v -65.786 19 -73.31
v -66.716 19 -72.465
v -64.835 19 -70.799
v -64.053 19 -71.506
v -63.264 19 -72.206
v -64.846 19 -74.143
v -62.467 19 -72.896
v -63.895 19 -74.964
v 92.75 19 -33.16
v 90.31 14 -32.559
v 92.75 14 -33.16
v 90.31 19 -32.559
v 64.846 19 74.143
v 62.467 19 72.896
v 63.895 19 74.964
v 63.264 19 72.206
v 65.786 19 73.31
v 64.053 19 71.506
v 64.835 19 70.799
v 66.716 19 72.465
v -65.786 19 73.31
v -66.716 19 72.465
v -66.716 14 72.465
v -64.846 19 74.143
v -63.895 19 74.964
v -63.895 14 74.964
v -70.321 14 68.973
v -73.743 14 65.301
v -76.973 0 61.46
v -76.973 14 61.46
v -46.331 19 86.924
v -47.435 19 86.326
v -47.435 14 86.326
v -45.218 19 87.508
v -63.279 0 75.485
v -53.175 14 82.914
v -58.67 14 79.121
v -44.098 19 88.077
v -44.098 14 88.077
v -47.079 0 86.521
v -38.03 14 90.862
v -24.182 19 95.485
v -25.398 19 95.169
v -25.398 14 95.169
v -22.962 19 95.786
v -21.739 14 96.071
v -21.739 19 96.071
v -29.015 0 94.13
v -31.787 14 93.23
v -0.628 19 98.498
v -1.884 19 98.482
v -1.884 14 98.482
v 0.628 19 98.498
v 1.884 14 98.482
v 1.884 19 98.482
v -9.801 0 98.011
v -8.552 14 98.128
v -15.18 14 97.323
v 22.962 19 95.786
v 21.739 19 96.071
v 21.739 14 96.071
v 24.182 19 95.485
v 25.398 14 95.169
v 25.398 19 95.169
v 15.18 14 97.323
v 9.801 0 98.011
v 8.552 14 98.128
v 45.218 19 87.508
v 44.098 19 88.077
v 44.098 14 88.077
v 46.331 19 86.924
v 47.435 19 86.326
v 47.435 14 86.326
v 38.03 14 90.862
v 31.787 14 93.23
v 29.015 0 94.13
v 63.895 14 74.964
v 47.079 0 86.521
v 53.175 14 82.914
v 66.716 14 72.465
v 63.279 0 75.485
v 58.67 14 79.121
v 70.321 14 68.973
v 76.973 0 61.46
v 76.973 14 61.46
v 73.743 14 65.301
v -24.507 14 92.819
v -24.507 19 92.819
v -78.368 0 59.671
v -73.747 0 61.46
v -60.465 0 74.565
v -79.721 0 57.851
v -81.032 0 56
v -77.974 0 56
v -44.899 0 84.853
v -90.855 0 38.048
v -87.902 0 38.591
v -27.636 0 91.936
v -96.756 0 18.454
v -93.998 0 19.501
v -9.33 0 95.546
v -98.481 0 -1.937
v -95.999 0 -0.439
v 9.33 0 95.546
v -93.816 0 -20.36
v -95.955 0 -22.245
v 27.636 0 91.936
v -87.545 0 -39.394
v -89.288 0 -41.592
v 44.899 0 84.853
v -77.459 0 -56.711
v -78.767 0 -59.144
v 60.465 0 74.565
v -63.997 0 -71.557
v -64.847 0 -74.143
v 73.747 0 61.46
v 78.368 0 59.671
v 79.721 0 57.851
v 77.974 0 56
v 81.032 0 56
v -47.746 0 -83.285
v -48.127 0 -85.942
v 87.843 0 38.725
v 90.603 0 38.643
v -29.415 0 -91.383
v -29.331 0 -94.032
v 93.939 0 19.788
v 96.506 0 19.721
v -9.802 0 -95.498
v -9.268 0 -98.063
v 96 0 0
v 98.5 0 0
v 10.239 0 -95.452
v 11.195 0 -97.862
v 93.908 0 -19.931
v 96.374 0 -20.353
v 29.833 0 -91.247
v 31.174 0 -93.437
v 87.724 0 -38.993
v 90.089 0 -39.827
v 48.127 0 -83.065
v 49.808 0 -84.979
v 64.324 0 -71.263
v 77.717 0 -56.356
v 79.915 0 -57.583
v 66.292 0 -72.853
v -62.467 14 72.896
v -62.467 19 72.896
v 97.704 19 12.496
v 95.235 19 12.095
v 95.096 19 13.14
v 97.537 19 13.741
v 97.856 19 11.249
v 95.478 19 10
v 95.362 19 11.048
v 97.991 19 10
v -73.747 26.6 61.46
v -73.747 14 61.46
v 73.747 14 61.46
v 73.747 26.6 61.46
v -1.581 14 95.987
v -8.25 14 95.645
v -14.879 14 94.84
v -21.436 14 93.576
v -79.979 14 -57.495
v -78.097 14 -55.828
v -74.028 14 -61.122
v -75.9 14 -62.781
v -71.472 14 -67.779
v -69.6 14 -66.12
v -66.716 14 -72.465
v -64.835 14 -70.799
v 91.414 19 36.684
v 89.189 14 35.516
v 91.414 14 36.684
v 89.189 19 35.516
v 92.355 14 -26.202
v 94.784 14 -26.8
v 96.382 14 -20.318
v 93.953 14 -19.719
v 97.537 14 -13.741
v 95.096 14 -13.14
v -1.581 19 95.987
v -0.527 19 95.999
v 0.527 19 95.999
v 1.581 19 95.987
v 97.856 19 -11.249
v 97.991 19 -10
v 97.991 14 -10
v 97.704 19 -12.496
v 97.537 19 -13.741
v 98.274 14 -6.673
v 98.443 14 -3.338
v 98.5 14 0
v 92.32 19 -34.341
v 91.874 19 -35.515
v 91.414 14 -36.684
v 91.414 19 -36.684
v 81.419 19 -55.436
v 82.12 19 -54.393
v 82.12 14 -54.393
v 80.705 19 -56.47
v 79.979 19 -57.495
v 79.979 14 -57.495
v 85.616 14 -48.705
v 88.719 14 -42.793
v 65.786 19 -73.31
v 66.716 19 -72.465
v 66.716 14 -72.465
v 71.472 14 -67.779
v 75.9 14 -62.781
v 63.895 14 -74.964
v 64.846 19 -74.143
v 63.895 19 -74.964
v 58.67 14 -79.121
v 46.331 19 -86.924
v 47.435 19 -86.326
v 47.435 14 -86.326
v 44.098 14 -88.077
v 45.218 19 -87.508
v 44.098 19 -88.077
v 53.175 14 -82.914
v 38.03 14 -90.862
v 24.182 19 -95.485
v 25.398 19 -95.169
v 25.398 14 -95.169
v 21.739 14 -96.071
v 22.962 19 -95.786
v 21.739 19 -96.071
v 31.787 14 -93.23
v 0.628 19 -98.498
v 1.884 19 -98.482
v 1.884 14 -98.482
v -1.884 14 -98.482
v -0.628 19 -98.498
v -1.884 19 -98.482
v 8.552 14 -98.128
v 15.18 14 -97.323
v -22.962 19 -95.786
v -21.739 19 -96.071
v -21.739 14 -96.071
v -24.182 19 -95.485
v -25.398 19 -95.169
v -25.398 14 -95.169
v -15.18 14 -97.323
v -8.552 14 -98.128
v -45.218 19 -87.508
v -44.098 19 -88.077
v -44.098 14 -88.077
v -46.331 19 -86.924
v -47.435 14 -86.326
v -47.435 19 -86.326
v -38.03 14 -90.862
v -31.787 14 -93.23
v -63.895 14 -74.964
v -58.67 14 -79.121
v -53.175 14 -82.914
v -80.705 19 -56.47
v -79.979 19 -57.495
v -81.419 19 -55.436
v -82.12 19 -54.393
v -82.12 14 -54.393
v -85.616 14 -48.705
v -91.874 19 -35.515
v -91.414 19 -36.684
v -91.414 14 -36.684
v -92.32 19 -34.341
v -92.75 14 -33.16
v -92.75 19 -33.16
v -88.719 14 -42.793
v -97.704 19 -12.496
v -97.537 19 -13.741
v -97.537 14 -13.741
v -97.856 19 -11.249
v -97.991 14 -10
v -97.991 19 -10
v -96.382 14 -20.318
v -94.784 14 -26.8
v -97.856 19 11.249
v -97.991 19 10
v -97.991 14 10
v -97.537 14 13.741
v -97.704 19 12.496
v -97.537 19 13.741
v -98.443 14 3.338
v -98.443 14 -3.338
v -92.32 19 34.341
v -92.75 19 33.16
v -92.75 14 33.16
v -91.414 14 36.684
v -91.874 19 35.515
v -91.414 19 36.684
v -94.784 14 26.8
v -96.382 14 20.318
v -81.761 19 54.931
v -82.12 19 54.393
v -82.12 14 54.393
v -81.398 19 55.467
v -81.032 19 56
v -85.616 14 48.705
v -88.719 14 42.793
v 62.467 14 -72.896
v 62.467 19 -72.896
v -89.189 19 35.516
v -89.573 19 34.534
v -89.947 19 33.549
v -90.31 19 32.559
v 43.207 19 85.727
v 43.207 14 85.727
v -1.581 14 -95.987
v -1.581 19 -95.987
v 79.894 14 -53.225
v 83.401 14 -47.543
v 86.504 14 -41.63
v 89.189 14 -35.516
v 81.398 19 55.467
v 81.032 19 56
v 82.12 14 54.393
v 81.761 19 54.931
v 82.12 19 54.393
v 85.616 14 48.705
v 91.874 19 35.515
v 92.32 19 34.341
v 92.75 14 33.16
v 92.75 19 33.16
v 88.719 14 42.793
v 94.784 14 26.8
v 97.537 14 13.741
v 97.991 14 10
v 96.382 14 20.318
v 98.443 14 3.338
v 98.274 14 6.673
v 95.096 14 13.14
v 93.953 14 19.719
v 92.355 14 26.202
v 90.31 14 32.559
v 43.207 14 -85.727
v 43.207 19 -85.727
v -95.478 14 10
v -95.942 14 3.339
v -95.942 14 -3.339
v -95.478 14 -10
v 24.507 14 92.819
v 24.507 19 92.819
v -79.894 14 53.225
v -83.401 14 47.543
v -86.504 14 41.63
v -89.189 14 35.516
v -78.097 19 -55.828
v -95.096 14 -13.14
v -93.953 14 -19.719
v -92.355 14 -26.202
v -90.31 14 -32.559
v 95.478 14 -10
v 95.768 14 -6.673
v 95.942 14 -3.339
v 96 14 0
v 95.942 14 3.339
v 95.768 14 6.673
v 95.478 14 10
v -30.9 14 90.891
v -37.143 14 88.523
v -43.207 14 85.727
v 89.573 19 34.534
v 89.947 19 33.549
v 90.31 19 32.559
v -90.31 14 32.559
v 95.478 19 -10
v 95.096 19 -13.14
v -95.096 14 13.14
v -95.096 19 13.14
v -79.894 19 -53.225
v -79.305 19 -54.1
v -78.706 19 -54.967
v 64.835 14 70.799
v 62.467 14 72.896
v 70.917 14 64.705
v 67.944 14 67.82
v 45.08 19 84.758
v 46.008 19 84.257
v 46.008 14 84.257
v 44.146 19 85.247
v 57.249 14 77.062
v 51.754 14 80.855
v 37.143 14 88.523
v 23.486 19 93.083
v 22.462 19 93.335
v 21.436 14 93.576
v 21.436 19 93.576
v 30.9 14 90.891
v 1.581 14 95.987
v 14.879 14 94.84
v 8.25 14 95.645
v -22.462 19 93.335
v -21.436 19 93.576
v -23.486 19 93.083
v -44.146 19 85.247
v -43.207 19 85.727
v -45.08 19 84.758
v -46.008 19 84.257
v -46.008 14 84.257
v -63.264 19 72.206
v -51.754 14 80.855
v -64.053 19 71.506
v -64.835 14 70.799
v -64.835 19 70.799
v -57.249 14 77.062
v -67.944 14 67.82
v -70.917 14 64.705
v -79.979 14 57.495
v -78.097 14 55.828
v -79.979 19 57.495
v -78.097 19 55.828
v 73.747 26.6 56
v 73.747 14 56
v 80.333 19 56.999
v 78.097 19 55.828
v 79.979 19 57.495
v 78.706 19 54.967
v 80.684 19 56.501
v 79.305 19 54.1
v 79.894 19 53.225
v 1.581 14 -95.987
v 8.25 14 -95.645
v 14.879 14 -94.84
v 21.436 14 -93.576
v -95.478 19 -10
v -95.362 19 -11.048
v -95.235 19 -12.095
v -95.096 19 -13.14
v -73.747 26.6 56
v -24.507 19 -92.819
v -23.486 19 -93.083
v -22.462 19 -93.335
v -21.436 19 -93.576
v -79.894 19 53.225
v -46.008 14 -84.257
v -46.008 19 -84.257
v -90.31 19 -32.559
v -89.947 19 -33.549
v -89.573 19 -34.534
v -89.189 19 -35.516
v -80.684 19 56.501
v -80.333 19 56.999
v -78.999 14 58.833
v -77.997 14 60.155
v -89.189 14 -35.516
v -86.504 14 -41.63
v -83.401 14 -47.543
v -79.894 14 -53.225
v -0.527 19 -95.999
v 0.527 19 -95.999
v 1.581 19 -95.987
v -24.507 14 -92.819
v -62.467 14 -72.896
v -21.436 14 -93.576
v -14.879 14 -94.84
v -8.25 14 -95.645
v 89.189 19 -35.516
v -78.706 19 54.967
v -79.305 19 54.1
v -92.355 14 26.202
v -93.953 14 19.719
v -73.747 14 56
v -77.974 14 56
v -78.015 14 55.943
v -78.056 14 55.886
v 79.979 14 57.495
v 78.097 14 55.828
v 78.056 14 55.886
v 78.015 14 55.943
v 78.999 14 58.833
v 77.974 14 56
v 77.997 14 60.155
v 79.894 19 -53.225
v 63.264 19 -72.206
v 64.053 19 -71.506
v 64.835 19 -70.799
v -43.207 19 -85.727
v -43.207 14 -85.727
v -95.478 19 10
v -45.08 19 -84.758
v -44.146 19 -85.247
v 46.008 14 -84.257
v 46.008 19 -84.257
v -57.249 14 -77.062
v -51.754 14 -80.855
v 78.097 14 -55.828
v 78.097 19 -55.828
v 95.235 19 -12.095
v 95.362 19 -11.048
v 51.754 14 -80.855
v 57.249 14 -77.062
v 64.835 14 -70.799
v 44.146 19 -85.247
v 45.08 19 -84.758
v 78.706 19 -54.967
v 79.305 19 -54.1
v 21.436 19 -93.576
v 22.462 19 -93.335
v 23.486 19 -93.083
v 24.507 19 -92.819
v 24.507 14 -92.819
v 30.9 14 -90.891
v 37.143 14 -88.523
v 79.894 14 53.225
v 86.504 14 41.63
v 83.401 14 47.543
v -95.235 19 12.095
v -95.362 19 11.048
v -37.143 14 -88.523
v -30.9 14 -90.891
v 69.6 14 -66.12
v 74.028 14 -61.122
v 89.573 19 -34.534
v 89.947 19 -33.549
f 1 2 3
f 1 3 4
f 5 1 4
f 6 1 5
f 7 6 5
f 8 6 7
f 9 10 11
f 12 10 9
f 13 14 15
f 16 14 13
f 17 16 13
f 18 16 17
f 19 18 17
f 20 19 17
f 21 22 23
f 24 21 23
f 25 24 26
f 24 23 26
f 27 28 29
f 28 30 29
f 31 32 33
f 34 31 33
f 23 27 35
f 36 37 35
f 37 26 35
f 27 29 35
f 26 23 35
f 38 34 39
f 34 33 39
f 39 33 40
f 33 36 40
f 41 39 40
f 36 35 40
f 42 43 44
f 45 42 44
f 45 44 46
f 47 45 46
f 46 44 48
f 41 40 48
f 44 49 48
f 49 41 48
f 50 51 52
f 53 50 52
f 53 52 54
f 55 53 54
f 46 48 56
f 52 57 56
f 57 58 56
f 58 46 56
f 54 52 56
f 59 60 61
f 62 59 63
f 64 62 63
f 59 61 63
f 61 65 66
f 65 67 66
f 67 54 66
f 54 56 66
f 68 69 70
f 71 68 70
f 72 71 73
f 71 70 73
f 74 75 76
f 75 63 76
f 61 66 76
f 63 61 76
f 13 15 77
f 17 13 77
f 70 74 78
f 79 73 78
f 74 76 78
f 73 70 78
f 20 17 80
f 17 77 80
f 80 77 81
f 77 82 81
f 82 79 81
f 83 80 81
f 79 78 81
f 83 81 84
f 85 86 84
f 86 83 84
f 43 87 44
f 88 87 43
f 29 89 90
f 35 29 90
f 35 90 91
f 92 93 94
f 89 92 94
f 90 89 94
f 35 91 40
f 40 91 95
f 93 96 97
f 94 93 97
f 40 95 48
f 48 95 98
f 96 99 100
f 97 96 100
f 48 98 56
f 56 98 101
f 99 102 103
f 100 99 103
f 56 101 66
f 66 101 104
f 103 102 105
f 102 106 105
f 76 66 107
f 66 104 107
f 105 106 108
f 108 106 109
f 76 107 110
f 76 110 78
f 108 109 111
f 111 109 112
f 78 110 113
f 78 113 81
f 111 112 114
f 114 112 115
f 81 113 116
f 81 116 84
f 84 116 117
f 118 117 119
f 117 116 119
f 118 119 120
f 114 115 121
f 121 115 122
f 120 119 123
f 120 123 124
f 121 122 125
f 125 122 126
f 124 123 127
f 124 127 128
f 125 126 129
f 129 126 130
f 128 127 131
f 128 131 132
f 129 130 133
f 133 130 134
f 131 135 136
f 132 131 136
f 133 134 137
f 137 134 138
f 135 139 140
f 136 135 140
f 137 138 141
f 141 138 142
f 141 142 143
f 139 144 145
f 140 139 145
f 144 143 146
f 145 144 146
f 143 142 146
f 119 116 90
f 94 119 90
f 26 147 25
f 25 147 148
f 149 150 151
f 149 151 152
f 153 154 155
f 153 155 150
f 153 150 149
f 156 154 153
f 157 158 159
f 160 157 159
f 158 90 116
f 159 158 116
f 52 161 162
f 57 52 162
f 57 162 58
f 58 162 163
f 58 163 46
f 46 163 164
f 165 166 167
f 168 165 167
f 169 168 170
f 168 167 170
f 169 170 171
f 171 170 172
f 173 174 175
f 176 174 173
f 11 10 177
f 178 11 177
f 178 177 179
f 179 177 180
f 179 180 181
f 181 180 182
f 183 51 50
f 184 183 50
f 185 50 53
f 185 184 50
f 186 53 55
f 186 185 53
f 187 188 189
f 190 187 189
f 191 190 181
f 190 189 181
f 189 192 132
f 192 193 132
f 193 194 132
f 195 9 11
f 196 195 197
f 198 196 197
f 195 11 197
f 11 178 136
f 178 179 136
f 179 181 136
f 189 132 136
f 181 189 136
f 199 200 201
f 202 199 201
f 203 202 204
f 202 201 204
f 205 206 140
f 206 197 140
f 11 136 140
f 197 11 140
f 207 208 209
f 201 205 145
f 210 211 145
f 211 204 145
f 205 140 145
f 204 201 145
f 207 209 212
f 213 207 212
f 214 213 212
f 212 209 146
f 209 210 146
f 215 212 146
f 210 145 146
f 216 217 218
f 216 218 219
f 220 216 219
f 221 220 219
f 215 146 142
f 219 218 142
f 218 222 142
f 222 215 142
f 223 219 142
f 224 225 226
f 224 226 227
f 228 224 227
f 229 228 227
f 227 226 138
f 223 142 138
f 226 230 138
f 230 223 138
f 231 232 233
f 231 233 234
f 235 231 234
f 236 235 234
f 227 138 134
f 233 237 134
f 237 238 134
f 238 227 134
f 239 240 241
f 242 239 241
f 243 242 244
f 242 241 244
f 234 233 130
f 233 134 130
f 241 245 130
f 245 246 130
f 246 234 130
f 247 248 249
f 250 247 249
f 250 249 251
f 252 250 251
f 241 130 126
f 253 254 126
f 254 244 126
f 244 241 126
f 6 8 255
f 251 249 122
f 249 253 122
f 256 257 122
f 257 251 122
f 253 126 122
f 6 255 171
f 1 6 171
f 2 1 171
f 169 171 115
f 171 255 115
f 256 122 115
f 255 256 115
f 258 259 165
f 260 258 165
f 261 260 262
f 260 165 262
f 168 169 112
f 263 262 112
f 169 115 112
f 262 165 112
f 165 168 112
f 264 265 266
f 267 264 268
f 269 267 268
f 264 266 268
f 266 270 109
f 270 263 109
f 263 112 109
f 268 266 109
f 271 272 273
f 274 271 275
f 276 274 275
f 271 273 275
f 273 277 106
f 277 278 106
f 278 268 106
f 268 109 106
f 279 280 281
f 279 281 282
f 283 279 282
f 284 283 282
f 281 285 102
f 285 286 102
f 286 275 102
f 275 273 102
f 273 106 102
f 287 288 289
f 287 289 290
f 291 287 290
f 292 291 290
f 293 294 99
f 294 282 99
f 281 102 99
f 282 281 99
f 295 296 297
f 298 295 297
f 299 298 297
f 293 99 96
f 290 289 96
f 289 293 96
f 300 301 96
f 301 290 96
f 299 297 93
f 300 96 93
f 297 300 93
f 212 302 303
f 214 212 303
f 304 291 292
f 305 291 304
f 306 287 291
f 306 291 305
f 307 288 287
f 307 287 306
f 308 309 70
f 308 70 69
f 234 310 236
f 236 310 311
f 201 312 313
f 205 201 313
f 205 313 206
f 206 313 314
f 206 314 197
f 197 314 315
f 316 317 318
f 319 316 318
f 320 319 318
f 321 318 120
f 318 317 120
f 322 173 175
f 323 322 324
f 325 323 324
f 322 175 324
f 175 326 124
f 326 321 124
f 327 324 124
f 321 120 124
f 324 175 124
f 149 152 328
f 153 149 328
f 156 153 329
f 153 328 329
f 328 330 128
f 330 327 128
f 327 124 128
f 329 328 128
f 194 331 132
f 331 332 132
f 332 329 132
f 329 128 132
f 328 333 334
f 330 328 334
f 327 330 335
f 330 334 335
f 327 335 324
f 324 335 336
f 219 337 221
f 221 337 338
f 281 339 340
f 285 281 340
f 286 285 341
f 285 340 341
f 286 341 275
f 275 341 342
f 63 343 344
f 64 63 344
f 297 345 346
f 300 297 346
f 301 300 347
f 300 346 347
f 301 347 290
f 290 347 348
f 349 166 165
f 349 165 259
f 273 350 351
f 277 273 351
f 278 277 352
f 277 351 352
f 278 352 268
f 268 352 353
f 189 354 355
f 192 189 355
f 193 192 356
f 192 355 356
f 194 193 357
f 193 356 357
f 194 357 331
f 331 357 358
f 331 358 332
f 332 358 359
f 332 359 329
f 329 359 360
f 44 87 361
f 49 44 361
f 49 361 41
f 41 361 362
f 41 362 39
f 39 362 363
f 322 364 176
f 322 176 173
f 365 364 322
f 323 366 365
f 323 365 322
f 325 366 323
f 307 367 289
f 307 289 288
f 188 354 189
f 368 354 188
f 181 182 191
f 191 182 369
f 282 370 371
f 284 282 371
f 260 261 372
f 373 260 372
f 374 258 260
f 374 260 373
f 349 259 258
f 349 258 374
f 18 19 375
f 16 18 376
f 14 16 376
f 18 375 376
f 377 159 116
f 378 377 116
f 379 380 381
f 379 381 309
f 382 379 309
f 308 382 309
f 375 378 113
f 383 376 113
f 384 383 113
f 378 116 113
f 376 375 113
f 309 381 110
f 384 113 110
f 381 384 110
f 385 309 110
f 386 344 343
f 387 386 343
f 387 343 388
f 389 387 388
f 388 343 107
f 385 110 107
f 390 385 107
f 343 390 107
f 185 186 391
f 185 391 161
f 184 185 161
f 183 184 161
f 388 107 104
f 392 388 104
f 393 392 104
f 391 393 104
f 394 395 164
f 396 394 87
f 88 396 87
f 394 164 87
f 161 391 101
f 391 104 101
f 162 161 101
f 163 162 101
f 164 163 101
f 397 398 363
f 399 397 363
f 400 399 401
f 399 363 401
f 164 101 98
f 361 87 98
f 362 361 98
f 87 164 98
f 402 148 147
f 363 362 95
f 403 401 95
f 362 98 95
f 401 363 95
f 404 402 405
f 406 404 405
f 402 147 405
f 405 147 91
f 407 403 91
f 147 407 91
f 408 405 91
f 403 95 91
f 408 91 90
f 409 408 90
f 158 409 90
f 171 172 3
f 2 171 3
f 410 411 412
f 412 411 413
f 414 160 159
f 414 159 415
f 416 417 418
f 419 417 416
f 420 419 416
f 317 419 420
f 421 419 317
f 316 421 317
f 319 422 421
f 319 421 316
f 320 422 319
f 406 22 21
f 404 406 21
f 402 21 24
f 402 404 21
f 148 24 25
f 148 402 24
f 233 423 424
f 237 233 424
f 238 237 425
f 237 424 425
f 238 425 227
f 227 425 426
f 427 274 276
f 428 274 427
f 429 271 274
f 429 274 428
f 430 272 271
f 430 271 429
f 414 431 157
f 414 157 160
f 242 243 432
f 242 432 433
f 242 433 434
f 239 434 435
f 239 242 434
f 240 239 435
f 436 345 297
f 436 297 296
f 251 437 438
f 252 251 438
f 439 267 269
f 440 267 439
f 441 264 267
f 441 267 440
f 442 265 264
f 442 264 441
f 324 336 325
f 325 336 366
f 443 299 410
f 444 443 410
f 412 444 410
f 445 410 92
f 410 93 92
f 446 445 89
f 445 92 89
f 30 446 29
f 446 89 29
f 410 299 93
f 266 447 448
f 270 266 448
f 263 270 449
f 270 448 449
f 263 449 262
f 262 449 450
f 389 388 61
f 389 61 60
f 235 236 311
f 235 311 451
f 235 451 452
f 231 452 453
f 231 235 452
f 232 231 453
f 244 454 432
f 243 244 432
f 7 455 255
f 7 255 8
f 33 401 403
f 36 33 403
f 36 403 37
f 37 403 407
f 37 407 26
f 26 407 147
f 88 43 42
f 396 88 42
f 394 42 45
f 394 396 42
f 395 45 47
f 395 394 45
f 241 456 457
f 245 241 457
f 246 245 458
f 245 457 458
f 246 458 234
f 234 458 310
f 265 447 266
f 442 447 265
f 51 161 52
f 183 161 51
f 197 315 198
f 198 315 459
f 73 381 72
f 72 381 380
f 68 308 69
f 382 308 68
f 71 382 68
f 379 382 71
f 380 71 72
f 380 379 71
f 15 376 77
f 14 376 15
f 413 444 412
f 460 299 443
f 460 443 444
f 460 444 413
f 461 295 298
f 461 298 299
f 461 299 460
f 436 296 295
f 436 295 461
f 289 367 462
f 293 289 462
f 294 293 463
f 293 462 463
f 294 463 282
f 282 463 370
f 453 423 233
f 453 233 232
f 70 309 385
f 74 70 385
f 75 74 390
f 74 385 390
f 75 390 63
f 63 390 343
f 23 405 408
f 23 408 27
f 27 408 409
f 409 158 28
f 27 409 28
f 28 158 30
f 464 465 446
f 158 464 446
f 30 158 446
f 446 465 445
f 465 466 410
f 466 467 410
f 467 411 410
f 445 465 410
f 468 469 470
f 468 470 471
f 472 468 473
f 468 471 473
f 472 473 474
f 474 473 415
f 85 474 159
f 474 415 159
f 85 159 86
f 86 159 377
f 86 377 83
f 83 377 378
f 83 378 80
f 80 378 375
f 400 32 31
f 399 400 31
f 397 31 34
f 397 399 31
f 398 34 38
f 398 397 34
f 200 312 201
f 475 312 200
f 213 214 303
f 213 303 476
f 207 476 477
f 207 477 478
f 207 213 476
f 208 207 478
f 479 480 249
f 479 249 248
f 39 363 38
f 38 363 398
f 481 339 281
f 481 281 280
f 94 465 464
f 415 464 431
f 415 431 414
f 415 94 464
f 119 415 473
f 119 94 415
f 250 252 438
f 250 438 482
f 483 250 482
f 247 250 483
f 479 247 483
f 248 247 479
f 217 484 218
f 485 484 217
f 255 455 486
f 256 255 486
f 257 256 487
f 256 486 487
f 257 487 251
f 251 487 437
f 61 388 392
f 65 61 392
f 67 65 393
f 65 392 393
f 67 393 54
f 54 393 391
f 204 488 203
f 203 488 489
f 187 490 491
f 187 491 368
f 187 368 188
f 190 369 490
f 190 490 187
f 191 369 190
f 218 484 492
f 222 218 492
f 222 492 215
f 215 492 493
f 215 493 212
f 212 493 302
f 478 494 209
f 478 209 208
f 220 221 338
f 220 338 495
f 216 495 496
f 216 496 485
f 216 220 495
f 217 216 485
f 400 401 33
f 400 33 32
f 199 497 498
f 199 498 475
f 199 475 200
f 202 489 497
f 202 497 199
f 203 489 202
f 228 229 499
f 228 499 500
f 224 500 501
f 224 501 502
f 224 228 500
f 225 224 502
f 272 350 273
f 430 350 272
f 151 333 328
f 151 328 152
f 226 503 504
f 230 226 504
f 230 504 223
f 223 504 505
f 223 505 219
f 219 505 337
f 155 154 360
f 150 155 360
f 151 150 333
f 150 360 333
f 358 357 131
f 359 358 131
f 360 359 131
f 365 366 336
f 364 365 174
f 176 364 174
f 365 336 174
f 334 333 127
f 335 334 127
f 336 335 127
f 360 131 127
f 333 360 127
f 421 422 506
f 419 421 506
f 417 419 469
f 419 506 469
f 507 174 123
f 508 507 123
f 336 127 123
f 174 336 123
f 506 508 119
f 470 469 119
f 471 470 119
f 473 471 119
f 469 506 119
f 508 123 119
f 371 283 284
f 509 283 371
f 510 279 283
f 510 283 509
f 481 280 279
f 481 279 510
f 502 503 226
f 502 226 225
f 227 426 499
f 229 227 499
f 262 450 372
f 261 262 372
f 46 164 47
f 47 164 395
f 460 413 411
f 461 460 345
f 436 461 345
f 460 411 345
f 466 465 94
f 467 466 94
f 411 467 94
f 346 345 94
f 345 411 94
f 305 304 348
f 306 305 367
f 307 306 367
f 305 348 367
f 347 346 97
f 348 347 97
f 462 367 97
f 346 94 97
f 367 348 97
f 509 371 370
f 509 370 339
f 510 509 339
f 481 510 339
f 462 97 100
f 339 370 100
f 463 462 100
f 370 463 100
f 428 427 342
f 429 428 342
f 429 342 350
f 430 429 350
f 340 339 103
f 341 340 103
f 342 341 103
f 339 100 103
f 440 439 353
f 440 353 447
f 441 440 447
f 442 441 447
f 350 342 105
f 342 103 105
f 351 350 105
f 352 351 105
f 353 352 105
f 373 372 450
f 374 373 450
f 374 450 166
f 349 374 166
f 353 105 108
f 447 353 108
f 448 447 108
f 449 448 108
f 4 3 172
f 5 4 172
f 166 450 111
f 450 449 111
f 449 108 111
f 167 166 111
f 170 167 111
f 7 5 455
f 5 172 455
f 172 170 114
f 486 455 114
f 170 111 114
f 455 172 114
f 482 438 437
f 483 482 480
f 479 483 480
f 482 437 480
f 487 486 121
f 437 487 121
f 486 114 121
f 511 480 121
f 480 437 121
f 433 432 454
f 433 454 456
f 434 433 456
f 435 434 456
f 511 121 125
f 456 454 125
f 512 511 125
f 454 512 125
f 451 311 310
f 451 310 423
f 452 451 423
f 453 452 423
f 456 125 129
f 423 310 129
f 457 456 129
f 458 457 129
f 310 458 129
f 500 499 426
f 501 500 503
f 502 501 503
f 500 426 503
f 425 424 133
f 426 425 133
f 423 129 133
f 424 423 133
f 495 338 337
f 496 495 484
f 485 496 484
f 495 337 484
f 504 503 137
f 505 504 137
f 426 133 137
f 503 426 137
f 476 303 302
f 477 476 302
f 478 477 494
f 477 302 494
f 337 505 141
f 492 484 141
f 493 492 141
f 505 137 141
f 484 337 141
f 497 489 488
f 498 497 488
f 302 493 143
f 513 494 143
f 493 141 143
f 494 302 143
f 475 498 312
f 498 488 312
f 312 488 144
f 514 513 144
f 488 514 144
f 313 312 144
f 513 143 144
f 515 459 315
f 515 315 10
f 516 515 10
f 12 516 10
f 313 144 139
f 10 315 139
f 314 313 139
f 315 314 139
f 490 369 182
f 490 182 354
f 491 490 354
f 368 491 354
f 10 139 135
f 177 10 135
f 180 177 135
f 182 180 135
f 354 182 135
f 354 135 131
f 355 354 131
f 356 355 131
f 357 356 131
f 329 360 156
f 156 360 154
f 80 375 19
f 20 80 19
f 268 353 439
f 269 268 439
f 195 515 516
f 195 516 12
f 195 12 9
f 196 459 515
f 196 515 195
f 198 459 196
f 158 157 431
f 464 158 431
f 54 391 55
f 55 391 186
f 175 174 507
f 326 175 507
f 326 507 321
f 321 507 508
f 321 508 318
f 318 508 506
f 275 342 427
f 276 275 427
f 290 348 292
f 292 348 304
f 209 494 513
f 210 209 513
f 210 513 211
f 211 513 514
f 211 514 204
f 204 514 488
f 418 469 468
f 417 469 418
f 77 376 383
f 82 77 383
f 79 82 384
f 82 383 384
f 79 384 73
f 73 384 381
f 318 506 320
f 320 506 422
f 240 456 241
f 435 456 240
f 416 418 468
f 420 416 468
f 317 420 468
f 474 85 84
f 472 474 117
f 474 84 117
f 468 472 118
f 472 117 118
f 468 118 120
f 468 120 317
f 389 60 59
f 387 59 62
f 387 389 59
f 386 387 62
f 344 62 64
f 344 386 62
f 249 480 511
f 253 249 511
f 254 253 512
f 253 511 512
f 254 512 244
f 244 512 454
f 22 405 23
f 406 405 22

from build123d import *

# Parameters (mm, degrees)
BOSS_EXTRUDE1_DEPTH = 19
SKETCH2_W           = 20
SKETCH2_H           = 11
CUT_EXTRUDE1_DEPTH  = 141.589828935
CIRPATTERN1_COUNT   = 26
SKETCH3_W           = 147.494656174
SKETCH3_H           = 5.46
BOSS_EXTRUDE2_DEPTH = 12.6


with BuildPart() as part:
    # Sketch1 → Boss-Extrude1 (new body)
    with BuildSketch(Plane(origin=(0, 0, 0), x_dir=(1, 0, 0), z_dir=(0, 1, 0))):
        with BuildLine():
            ThreePointArc((76.973491541, -61.46), (79.050100656, -58.765054125), (81.032400927, -56))
            Line((81.032400927, -56), (77.974354758, -56))
            ThreePointArc((77.974354758, -56), (75.90994771, -58.76801714), (73.747328087, -61.46))
            Line((73.747328087, -61.46), (76.973491541, -61.46))
        make_face()
        with BuildLine():
            ThreePointArc((73.747328087, -61.46), (75.90994771, -58.76801714), (77.974354758, -56))
            Line((77.974354758, -56), (-77.974354758, -56))
            ThreePointArc((-77.974354758, -56), (-75.90994771, -58.76801714), (-73.747328087, -61.46))
            Line((-73.747328087, -61.46), (73.747328087, -61.46))
        make_face()
        with BuildLine():
            ThreePointArc((-73.747328087, -61.46), (-75.90994771, -58.76801714), (-77.974354758, -56))
            Line((-77.974354758, -56), (-81.032400927, -56))
            ThreePointArc((-81.032400927, -56), (-79.050100656, -58.765054125), (-76.973491541, -61.46))
            Line((-76.973491541, -61.46), (-73.747328087, -61.46))
        make_face()
        with BuildLine():
            Line((77.974354758, -56), (81.032400927, -56))
            ThreePointArc((81.032400927, -56), (94.031753922, -29.330517458), (98.5, 0))
            ThreePointArc((98.5, 0), (-29.330517458, 94.031753922), (-81.032400927, -56))
            Line((-81.032400927, -56), (-77.974354758, -56))
            ThreePointArc((-77.974354758, -56), (-29.414808713, 91.382542252), (96, 0))
            ThreePointArc((96, 0), (91.382542252, -29.414808713), (77.974354758, -56))
        make_face()
        with BuildLine():
            ThreePointArc((-76.973491541, -61.46), (0, -98.5), (76.973491541, -61.46))
            Line((76.973491541, -61.46), (73.747328087, -61.46))
            ThreePointArc((73.747328087, -61.46), (0, -96), (-73.747328087, -61.46))
            Line((-73.747328087, -61.46), (-76.973491541, -61.46))
        make_face()
    extrude(amount=BOSS_EXTRUDE1_DEPTH)

    # Sketch2 → Cut-Extrude1 (cut, through all)
    with BuildSketch(Plane(origin=(0, 0, 0), x_dir=(0, 0, -1), z_dir=(1, 0, 0))):
        with Locations((0, 19.5)):
            Rectangle(SKETCH2_W, SKETCH2_H)
    cut_extrude1 = extrude(amount=-CUT_EXTRUDE1_DEPTH, mode=Mode.SUBTRACT)

    # CirPattern1: Cut-Extrude1 ×26 about axis
    cirpattern1_axis = Axis((0, 0, 0), (0, 1, 0))
    for i in range(1, CIRPATTERN1_COUNT):
        add(cut_extrude1.rotate(cirpattern1_axis, i * 360 / CIRPATTERN1_COUNT), mode=Mode.SUBTRACT)

    # Sketch3 → Boss-Extrude2 (add)
    with BuildSketch(Plane(origin=(0, 14, 0), x_dir=(1, 0, 0), z_dir=(0, 1, 0))):
        with Locations((0, -58.73)):
            Rectangle(SKETCH3_W, SKETCH3_H)
    extrude(amount=BOSS_EXTRUDE2_DEPTH)


solid = part.part
